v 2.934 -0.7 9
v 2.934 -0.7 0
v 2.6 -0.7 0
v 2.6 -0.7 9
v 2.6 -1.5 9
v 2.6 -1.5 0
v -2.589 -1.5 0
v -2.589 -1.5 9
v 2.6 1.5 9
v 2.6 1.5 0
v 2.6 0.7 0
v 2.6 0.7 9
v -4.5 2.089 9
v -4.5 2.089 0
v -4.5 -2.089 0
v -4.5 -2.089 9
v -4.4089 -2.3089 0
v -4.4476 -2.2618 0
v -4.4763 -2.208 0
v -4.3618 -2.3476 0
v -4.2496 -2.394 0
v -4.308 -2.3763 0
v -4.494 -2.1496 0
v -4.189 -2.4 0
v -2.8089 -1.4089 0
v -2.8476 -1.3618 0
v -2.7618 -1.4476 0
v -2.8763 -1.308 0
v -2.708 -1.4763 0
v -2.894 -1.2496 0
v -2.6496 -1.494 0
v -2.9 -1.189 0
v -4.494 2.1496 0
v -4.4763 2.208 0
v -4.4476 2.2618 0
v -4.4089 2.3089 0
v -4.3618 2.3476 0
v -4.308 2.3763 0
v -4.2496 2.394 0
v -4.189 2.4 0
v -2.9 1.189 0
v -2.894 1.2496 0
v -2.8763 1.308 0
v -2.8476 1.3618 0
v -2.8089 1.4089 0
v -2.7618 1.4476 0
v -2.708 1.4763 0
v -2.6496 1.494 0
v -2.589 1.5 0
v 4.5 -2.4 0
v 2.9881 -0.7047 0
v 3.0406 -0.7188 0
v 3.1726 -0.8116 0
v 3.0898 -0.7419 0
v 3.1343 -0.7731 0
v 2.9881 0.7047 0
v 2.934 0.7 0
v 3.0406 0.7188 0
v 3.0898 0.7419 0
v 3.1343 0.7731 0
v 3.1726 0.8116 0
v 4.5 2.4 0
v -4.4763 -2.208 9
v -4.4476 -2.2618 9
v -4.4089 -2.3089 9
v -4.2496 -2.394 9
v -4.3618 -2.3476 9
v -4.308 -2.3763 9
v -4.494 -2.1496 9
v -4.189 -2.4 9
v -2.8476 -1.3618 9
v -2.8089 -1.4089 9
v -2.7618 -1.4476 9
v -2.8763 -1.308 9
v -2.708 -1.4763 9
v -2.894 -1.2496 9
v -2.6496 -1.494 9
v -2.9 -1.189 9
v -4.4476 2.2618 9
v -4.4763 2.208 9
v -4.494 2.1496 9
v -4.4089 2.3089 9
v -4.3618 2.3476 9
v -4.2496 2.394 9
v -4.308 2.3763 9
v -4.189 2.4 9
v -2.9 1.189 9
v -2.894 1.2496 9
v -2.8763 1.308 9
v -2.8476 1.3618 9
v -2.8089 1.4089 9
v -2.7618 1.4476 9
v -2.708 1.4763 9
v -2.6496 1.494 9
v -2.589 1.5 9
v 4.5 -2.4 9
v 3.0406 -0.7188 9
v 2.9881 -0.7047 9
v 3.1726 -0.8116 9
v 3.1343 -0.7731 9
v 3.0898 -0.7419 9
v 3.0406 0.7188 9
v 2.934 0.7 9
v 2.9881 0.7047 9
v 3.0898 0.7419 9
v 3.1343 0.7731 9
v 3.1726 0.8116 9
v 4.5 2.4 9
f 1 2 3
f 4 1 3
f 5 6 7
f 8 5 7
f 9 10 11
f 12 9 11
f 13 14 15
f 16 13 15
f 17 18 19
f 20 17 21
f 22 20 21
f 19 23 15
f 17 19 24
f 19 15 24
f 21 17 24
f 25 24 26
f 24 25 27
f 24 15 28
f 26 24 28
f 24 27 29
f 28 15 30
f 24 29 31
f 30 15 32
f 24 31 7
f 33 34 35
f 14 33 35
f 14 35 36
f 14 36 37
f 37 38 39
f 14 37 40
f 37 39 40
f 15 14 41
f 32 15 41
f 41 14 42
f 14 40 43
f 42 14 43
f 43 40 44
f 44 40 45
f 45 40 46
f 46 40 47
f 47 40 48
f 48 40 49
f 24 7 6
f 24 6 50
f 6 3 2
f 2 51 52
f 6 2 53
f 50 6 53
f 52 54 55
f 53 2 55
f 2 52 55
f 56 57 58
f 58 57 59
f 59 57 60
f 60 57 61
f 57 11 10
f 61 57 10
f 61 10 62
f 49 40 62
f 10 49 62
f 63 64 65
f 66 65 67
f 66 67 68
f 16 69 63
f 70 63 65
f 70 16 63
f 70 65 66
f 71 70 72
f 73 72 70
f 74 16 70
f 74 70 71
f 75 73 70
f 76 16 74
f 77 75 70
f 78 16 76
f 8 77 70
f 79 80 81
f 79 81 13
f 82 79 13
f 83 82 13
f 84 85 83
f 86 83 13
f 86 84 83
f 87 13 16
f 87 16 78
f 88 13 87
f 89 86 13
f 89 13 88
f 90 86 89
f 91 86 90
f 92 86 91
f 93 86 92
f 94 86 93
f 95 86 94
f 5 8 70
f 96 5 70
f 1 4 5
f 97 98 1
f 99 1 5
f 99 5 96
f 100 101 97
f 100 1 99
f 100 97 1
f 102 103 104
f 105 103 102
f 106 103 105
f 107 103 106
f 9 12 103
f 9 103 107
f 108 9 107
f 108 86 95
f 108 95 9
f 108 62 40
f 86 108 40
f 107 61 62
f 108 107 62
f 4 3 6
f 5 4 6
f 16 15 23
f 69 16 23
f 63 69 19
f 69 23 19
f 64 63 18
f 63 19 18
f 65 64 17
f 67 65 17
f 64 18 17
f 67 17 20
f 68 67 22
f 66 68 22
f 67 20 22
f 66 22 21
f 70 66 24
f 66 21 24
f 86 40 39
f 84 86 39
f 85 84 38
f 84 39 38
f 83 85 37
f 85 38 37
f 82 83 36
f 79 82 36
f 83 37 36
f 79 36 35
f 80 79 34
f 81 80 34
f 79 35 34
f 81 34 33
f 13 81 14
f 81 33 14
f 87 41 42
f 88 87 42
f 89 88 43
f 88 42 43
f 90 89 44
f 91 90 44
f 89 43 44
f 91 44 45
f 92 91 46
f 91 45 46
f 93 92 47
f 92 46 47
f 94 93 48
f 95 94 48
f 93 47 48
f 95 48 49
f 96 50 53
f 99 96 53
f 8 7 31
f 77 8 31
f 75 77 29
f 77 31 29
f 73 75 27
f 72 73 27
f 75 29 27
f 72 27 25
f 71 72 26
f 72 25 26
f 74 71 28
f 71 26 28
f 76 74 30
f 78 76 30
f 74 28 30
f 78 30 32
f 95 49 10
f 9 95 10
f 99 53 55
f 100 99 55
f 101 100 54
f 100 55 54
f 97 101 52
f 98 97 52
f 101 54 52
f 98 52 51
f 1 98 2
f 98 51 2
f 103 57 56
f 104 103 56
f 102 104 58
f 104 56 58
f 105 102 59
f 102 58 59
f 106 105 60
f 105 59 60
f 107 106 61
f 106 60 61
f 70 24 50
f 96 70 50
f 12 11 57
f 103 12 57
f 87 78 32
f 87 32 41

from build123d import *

# Parameters (mm, degrees)
F1_DEPTH = 9


with BuildPart() as f1:
    # F0 (on Top) → F1 (new body)
    with BuildSketch(Plane.XY):
        with BuildLine():
            Line((-4.188961, -2.4), (4.5, -2.4))
            Line((4.5, -2.4), (3.172631, -0.811589))
            ThreePointArc((3.172631, -0.811589), (3.065694, -0.729275), (2.933958, -0.7))
            Line((2.933958, -0.7), (2.6, -0.7))
            Line((2.6, -0.7), (2.6, -1.5))
            Line((2.6, -1.5), (-2.588961, -1.5))
            ThreePointArc((-2.588961, -1.5), (-2.808899, -1.408899), (-2.9, -1.188961))
            Line((-2.9, -1.188961), (-2.9, 1.188961))
            ThreePointArc((-2.9, 1.188961), (-2.808899, 1.408899), (-2.588961, 1.5))
            Line((-2.588961, 1.5), (2.6, 1.5))
            Line((2.6, 1.5), (2.6, 0.7))
            Line((2.6, 0.7), (2.933958, 0.7))
            ThreePointArc((2.933958, 0.7), (3.065694, 0.729275), (3.172631, 0.811589))
            Line((3.172631, 0.811589), (4.5, 2.4))
            Line((4.5, 2.4), (-4.188961, 2.4))
            ThreePointArc((-4.188961, 2.4), (-4.408899, 2.308899), (-4.5, 2.088961))
            Line((-4.5, 2.088961), (-4.5, -2.088961))
            ThreePointArc((-4.5, -2.088961), (-4.408899, -2.308899), (-4.188961, -2.4))
        make_face()
    extrude(amount=F1_DEPTH)


solid = f1.part
